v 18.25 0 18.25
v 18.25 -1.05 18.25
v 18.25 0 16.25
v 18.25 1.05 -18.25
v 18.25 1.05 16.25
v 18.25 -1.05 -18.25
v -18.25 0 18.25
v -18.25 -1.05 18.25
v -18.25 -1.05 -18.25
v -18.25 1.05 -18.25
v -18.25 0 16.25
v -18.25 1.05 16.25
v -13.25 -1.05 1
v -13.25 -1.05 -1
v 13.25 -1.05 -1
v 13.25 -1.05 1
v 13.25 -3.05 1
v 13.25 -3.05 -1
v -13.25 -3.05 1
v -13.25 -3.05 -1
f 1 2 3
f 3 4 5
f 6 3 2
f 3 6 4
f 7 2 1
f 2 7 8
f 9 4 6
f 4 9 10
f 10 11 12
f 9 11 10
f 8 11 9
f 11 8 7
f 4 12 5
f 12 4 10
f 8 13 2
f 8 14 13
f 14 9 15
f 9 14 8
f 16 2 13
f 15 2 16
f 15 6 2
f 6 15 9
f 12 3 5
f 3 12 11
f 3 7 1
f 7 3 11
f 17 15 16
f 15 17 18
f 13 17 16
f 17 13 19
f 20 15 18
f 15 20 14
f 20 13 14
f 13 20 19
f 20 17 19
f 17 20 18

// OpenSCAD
module remote_cutter(){
    difference(){
        translate([0, 0, 0]){
            cube([41.2, 19.2, 22], center=true);
        }
        translate([0,  15.9, (22-12)/1.99]){
            cube([34.5, 19.2, 12], center=true);
        }
    }
}

module body(){
    difference(){
        cube([48,   28, 44/2], center=true);
        translate([0,0,-1]){
            difference(){
                remote_cutter();
            }
        }
    }
}


module better_cover(){
    union(){
        difference(){
            cube([36.5, 2.1, 36.5], center=true);
            translate([0,1,34.5]){
                cube([40, 2.0, 36.5], center=true);
            }
        }
        translate([0,-2.0,0]){
            cube([26.5, 2.1, 2.0], center=true);
        }
    }
}
better_cover();
//body();
